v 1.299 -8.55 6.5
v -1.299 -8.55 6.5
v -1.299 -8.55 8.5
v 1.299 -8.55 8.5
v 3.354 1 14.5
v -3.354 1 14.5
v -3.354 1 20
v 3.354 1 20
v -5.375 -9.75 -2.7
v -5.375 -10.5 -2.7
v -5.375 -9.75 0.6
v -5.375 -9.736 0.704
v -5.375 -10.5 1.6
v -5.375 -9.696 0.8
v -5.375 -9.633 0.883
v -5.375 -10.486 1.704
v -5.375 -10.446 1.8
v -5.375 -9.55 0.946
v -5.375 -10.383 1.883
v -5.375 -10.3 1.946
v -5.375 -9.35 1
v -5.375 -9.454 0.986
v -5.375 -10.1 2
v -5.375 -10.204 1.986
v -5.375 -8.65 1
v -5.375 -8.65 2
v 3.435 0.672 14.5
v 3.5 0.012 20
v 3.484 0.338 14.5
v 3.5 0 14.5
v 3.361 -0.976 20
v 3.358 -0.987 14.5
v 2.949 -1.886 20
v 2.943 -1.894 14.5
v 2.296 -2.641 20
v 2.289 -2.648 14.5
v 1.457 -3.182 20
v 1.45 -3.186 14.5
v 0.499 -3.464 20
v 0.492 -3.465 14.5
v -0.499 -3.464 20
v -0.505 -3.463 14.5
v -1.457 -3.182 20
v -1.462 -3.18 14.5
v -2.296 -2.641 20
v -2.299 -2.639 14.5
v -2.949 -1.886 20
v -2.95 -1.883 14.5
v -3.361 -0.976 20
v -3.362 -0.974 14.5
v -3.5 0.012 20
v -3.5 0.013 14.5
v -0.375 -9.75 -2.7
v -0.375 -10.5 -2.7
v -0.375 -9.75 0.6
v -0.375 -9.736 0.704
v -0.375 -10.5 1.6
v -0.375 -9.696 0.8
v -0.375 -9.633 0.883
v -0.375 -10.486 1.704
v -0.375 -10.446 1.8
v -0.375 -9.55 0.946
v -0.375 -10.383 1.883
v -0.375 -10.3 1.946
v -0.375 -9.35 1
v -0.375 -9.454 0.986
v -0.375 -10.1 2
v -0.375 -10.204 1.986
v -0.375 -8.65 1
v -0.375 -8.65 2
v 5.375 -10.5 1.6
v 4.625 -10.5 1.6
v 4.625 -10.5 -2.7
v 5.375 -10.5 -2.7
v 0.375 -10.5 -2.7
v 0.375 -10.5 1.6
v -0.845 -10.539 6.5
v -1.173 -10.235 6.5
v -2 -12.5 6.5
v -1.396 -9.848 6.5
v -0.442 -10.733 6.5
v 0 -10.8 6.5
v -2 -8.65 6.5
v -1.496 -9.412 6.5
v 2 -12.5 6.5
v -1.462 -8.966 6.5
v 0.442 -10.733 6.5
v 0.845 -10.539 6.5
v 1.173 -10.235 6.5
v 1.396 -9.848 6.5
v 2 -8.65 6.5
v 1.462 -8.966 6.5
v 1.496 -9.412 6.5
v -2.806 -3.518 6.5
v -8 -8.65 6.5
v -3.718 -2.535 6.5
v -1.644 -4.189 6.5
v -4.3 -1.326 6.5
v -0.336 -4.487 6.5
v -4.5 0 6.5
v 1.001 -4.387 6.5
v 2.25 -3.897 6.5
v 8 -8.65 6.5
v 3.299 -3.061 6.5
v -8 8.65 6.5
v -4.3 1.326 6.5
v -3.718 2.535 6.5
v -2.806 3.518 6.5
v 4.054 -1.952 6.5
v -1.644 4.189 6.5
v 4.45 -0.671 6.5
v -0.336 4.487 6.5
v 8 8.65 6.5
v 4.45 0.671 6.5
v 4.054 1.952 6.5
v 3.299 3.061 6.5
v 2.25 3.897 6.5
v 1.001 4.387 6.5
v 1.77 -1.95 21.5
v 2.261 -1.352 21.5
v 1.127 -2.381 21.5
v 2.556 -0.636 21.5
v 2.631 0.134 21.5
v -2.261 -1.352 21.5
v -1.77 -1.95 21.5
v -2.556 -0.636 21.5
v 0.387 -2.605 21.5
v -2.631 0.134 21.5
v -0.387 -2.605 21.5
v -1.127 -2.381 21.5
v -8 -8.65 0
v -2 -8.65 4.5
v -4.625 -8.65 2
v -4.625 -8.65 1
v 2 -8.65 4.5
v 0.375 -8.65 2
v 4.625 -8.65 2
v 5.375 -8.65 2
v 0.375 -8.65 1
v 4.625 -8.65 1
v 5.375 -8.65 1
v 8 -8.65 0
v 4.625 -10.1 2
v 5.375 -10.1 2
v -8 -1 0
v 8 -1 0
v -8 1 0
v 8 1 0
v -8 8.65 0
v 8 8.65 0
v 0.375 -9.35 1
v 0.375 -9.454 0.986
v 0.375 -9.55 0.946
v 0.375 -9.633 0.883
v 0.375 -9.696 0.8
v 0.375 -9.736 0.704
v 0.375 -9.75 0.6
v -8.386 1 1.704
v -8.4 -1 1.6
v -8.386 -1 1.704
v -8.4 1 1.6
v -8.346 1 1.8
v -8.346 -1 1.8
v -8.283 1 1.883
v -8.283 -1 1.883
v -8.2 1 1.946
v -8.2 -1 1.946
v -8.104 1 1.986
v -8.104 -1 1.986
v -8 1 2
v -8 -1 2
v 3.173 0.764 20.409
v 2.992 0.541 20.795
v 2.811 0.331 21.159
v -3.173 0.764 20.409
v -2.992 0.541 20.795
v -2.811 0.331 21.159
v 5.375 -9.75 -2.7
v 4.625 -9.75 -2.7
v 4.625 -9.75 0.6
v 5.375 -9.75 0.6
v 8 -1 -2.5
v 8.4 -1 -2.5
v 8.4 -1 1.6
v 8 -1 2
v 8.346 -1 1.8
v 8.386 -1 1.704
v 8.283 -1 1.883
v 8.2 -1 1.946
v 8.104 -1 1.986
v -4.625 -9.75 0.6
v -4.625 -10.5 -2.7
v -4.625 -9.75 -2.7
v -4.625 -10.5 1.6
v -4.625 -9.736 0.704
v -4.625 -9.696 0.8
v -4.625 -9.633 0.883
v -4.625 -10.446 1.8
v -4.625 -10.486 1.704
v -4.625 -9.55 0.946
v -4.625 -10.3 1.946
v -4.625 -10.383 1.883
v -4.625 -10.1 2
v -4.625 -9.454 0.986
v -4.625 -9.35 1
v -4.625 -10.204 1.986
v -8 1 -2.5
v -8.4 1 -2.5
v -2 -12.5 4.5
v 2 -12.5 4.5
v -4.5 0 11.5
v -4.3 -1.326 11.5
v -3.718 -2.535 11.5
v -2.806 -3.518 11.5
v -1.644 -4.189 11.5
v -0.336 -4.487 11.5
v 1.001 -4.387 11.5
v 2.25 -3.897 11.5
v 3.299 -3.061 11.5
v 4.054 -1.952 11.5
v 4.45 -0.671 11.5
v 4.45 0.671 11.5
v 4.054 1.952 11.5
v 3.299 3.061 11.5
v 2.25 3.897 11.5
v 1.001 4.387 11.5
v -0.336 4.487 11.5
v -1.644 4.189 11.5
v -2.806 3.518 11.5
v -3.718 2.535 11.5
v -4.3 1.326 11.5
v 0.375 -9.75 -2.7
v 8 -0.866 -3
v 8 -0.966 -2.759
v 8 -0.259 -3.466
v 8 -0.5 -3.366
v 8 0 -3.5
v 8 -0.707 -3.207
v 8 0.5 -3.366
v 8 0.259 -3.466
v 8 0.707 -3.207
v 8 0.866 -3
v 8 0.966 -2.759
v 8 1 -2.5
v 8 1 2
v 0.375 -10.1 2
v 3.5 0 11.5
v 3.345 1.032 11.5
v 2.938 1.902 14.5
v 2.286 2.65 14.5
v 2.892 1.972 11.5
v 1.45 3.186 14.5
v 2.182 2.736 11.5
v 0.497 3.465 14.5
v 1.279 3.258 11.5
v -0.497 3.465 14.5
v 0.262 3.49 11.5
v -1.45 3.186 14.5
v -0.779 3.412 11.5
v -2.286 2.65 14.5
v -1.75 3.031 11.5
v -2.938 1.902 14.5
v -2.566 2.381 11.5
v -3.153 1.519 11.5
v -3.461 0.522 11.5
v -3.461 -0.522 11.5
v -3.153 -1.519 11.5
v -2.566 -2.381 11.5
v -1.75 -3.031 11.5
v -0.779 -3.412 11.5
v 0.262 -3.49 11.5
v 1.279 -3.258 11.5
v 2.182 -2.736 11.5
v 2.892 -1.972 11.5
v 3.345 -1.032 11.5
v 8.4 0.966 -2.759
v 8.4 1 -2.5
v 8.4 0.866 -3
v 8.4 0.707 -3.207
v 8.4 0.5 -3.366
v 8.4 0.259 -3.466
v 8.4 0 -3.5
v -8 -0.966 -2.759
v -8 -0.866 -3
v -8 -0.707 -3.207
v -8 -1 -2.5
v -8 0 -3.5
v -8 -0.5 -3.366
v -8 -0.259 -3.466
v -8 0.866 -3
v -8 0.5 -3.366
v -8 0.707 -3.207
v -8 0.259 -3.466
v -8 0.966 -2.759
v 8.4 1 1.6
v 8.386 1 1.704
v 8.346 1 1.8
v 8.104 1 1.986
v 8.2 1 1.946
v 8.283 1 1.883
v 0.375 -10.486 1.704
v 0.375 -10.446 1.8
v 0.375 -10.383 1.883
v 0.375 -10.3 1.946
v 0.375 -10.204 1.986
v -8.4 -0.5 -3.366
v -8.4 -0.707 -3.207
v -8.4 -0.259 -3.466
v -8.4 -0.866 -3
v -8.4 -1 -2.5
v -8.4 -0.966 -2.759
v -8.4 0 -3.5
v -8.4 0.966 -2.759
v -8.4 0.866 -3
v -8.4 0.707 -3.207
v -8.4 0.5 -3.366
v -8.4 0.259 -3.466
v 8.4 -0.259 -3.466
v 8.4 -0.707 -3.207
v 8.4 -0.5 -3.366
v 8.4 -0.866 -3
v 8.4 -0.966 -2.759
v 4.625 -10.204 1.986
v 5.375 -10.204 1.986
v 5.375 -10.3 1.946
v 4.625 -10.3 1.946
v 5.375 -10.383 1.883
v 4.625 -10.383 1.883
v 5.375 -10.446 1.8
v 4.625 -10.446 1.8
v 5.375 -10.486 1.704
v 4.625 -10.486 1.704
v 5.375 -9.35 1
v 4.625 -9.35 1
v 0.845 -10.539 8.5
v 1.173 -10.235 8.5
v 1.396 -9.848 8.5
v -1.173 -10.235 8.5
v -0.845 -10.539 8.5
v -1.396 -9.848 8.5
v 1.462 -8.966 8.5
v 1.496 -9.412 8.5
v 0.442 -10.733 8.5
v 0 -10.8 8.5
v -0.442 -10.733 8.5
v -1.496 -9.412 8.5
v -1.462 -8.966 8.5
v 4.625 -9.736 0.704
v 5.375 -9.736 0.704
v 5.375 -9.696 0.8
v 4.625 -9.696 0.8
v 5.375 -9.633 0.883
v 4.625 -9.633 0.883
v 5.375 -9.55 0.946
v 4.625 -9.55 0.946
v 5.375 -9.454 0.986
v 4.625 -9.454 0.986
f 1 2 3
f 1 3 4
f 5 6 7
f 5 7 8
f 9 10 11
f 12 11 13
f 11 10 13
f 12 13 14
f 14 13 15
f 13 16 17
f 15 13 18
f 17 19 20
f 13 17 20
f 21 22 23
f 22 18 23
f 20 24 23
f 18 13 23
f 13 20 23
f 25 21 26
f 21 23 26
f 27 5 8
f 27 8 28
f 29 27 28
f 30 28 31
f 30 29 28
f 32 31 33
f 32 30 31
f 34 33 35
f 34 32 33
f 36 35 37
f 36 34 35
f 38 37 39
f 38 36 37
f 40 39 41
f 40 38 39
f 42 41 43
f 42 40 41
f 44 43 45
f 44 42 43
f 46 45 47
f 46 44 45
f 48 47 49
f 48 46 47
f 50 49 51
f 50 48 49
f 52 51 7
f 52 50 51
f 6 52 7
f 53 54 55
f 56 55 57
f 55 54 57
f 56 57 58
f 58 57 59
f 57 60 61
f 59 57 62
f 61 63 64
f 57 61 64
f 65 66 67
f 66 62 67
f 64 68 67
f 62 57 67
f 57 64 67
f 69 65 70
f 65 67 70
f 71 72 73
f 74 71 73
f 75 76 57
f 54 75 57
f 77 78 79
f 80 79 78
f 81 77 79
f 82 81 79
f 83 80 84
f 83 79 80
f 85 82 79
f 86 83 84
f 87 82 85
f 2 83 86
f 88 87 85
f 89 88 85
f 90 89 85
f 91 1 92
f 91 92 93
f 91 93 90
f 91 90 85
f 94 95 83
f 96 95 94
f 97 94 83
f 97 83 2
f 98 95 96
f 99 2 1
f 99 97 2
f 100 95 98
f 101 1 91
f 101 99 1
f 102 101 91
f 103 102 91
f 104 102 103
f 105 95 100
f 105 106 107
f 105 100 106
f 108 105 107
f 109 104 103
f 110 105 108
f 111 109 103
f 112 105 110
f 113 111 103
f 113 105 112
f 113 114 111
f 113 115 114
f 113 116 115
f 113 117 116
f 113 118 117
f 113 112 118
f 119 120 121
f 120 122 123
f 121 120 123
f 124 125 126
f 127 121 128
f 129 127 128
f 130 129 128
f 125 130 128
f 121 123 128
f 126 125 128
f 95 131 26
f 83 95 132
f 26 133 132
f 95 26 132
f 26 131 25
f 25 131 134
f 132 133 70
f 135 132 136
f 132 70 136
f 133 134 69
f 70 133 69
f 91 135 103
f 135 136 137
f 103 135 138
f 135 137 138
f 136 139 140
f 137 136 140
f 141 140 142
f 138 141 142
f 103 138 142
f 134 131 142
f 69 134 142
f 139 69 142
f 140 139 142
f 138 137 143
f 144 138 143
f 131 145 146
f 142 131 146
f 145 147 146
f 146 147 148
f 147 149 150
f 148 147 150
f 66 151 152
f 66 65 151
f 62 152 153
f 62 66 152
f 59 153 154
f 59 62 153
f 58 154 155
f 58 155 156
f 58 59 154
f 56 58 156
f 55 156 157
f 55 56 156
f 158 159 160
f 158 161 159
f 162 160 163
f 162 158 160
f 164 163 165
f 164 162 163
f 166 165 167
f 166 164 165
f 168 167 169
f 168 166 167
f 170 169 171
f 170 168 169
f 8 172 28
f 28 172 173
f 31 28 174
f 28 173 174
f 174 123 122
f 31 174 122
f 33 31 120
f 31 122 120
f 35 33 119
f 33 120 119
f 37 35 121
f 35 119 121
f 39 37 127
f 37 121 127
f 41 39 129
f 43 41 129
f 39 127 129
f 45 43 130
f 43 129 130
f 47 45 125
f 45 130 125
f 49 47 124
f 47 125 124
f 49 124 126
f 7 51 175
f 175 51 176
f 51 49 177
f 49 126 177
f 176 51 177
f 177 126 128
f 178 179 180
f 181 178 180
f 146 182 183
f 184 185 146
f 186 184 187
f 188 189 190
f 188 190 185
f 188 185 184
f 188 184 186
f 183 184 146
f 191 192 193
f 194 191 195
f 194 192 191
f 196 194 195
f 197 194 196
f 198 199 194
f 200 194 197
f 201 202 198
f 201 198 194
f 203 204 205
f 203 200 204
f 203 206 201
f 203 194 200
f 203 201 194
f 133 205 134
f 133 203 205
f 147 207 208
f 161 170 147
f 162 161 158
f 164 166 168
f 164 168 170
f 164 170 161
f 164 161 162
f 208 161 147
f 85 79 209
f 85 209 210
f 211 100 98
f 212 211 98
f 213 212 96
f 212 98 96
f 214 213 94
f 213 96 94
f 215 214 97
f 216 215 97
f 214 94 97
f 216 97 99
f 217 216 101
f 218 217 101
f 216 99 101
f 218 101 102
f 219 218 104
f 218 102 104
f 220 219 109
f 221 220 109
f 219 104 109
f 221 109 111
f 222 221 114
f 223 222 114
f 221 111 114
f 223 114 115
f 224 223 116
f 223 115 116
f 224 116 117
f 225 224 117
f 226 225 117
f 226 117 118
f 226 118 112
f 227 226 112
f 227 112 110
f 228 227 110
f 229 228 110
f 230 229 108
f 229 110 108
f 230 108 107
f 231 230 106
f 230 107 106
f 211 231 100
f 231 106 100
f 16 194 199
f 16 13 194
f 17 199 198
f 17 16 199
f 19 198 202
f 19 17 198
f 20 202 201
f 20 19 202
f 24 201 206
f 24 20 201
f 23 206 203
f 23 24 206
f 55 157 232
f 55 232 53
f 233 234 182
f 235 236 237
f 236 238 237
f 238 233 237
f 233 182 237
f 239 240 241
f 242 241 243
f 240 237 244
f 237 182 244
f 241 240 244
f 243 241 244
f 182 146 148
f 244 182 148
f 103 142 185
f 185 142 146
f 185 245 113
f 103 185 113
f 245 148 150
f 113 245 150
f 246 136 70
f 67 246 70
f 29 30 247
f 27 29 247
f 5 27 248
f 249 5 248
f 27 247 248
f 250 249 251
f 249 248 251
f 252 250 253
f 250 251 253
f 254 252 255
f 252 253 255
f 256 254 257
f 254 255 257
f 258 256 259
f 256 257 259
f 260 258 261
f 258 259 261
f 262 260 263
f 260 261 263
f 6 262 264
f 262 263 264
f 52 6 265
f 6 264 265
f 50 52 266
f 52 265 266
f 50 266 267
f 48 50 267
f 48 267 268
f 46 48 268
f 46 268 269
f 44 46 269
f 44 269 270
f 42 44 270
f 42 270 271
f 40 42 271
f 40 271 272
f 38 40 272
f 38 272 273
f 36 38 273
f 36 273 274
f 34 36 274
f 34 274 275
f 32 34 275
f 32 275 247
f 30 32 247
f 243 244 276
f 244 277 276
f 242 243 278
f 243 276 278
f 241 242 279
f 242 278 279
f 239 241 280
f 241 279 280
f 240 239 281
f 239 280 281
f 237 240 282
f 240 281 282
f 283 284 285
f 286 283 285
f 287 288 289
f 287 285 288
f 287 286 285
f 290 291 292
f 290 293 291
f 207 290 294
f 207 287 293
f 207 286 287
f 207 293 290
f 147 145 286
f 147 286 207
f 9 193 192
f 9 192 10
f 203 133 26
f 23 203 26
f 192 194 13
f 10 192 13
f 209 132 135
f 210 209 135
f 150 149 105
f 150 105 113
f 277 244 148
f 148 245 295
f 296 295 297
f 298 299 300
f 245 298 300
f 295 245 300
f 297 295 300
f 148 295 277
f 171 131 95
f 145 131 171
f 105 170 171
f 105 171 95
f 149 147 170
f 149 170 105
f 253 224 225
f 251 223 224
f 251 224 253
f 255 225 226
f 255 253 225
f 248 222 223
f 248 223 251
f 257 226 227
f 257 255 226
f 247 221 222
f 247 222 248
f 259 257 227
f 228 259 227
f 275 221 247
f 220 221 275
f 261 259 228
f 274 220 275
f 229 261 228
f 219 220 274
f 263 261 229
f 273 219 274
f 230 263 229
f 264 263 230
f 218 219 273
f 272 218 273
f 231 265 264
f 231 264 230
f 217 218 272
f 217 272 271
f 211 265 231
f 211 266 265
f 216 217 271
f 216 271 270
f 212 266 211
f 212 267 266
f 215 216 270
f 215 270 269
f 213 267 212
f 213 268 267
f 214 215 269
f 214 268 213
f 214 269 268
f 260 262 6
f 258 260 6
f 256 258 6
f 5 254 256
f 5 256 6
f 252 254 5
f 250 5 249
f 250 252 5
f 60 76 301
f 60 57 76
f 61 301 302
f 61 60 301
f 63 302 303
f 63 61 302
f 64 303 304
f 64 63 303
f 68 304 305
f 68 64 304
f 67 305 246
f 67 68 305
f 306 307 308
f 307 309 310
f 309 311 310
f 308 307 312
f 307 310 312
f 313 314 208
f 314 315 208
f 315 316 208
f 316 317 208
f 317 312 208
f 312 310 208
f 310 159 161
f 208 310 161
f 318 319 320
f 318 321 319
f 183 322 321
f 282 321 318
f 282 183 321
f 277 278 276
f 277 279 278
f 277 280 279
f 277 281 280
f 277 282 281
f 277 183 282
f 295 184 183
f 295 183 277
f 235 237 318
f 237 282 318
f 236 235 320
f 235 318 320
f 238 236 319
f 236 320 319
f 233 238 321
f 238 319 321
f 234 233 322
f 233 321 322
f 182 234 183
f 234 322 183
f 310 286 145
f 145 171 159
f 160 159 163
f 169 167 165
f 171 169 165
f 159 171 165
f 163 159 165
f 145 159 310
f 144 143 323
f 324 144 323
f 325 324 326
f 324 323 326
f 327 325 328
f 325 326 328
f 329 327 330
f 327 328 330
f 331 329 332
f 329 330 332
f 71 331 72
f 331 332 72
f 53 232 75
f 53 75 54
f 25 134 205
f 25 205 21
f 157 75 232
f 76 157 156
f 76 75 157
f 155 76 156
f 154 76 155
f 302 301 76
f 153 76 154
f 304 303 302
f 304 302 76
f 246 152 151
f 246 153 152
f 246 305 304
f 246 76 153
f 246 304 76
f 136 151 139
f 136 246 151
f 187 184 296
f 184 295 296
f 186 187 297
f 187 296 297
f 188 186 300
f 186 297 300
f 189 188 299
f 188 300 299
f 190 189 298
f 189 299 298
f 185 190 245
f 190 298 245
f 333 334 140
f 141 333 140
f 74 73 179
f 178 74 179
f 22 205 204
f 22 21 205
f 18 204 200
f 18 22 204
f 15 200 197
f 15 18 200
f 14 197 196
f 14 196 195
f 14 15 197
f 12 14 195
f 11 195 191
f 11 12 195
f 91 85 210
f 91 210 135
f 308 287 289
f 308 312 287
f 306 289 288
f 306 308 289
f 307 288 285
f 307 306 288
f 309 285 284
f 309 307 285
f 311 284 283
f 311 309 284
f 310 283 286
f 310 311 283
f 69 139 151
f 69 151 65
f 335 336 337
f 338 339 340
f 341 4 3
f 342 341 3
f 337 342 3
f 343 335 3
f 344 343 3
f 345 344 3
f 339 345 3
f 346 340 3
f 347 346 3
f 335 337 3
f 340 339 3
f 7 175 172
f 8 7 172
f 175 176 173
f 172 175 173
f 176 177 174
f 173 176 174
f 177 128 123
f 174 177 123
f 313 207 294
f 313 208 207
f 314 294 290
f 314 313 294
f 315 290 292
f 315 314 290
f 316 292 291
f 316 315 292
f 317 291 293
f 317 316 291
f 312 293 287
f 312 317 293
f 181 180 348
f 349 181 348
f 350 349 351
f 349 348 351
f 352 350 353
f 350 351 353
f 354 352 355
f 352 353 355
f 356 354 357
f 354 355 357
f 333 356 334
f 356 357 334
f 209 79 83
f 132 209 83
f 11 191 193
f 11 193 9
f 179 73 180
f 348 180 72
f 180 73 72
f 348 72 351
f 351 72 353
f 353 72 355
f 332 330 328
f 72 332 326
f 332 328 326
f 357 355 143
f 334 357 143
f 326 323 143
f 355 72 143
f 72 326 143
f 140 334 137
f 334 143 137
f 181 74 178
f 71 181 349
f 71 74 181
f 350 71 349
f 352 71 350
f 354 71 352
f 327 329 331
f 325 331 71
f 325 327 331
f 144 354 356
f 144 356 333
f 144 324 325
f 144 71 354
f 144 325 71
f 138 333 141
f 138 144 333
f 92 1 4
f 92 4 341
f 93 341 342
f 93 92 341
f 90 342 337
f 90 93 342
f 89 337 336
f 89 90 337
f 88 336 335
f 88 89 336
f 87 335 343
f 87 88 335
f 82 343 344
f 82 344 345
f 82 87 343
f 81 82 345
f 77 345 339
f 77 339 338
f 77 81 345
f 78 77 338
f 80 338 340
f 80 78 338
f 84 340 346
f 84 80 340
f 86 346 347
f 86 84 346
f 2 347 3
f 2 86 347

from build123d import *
from OCP.BRepFilletAPI import BRepFilletAPI_MakeChamfer

# Parameters (mm, degrees)
SKETCH1_W              = 16
SKETCH1_H              = 17.3
BOSS_EXTRUDE1_DEPTH    = 6.5
SKETCH2_W              = 4
SKETCH2_H              = 3.85
BOSS_EXTRUDE2_DEPTH    = 2
BOSS_EXTRUDE3_DEPTH    = 2
SKETCH4_R              = 4.5
BOSS_EXTRUDE4_DEPTH    = 5
SKETCH5_R              = 3.5
BOSS_EXTRUDE5_DEPTH    = 3
BOSS_EXTRUDE6_DEPTH    = 7
CHAMFER1_SIZE          = 1.5
CHAMFER1_SIZE2         = 0.866025404
SKETCH7_W              = 0.75
SKETCH7_H              = 1.85
BOSS_EXTRUDE7_DEPTH    = 1
SKETCH8_W              = 0.75
SKETCH8_H              = 0.75
BOSS_EXTRUDE8_DEPTH    = 3.7
FILLET1_R              = 0.4
LPATTERN1_COUNT        = 2
LPATTERN1_PITCH        = 5
FILLET1_OF_LPATTERN1_R = 0.4
MIRROR1_START          = 4.625
MIRROR1_DEPTH          = 0.75
SKETCH10_W             = 0.4
SKETCH10_H             = 2
BOSS_EXTRUDE9_DEPTH    = 5.5
FILLET2_R              = 0.4
FILLET3_R              = 1
FILLET2_OF_MIRROR2_R   = 0.4
FILLET3_OF_MIRROR2_R   = 1


# Read off the part's stored shape, not the designer's step: Mirror1
with BuildPart() as part:
    # Sketch1 → Boss-Extrude1 (new body)
    with BuildSketch(Plane.XY):
        Rectangle(SKETCH1_W, SKETCH1_H)
    extrude(amount=BOSS_EXTRUDE1_DEPTH)

    # Sketch2 → Boss-Extrude2 (add)
    with BuildSketch(Plane.XY.offset(6.5)):
        with Locations((0, -10.575)):
            Rectangle(SKETCH2_W, SKETCH2_H)
    extrude(amount=-BOSS_EXTRUDE2_DEPTH)

    # Sketch3 → Boss-Extrude3 (add)
    with BuildSketch(Plane.XY.offset(6.5)):
        with BuildLine():
            Line((-1.299038106, -8.55), (1.299038106, -8.55))
            ThreePointArc((1.299038106, -8.55), (0, -10.8), (-1.299038106, -8.55))
        make_face()
    extrude(amount=BOSS_EXTRUDE3_DEPTH)

    # Sketch4 → Boss-Extrude4 (add)
    with BuildSketch(Plane.XY.offset(6.5)):
        with Locations(Location((0, 0, 0), (0, 0, 180))):
            Circle(SKETCH4_R)
    extrude(amount=BOSS_EXTRUDE4_DEPTH)

    # Sketch5 → Boss-Extrude5 (add)
    with BuildSketch(Plane.XY.offset(11.5)):
        Circle(SKETCH5_R)
    extrude(amount=BOSS_EXTRUDE5_DEPTH)

    # Sketch6 → Boss-Extrude6 (add)
    with BuildSketch(Plane.XY.offset(14.5)):
        with BuildLine():
            Line((-3.354101966, 1), (3.354101966, 1))
            ThreePointArc((3.354101966, 1), (0, -3.5), (-3.354101966, 1))
        make_face()
    extrude(amount=BOSS_EXTRUDE6_DEPTH)

    # Chamfer1: one chamfer whose edges measure the first distance from different faces: ONE call of the kernel's chamfer builder (chamfer() names one face for all edges)
    chamfer1_edges_1 = [part.edges().sort_by_distance(p)[0] for p in [
        (0, -3.5, 21.5),
    ]]
    chamfer1_side_1 = [part.faces().sort_by_distance(p)[0] for p in [
        (0, -3.5, 18),
    ]]
    chamfer1_edges_2 = [part.edges().sort_by_distance(p)[0] for p in [
        (0, 1, 21.5),
    ]]
    chamfer1_side_2 = [part.faces().sort_by_distance(p)[0] for p in [
        (0, 1, 18),
    ]]
    chamfer1 = BRepFilletAPI_MakeChamfer(part.part.solid().wrapped)
    for e in chamfer1_edges_1:
        chamfer1.Add(CHAMFER1_SIZE, CHAMFER1_SIZE2, e.wrapped, chamfer1_side_1[0].wrapped)  # the first distance lies on this face
    for e in chamfer1_edges_2:
        chamfer1.Add(CHAMFER1_SIZE, CHAMFER1_SIZE2, e.wrapped, chamfer1_side_2[0].wrapped)  # the first distance lies on this face
    add(Compound.cast(chamfer1.Shape()), mode=Mode.REPLACE)

    # Sketch7 → Boss-Extrude7 (add)
    with BuildSketch(Plane(origin=(0, 0, 2), x_dir=(-1, 0, 0), z_dir=(0, 0, -1))):
        with Locations((0, -9.575)):
            Rectangle(SKETCH7_W, SKETCH7_H)
    boss_extrude7 = extrude(amount=BOSS_EXTRUDE7_DEPTH)

    # Sketch8 → Boss-Extrude8 (add)
    with BuildSketch(Plane(origin=(0, 0, 1), x_dir=(-1, 0, 0), z_dir=(0, 0, -1))):
        with Locations((0, -10.125)):
            Rectangle(SKETCH8_W, SKETCH8_H)
    boss_extrude8 = extrude(amount=BOSS_EXTRUDE8_DEPTH)

    # Fillet1
    fillet1_edges = [part.edges().sort_by_distance(p)[0] for p in [
        (0, -10.5, 2),
        (0, -9.75, 1),
    ]]
    fillet(fillet1_edges, radius=FILLET1_R)

    # LPattern1: Boss-Extrude7, Boss-Extrude8 ×2
    with Locations(*[(-i * LPATTERN1_PITCH, 0, 0) for i in range(1, LPATTERN1_COUNT)]):
        add(boss_extrude7)
        add(boss_extrude8)

    # Fillet1 of LPattern1
    fillet1_of_lpattern1_edges = [part.edges().sort_by_distance(p)[0] for p in [
        (-5, -10.5, 2),
        (-5, -9.75, 1),
    ]]
    fillet(fillet1_of_lpattern1_edges, radius=FILLET1_OF_LPATTERN1_R)

    # Mirror1 outline → Mirror1 (add)
    with BuildSketch(Plane.YZ.offset(MIRROR1_START)):
        with BuildLine():
            ThreePointArc((-9.75, 0.6), (-9.632842712, 0.882842712), (-9.35, 1))
            Line((-9.35, 1), (-8.65, 1))
            Line((-8.65, 1), (-8.65, 2))
            Line((-8.65, 2), (-10.1, 2))
            ThreePointArc((-10.1, 2), (-10.382842712, 1.882842712), (-10.5, 1.6))
            Line((-10.5, 1.6), (-10.5, -2.7))
            Line((-10.5, -2.7), (-9.75, -2.7))
            Line((-9.75, -2.7), (-9.75, 0.6))
        make_face()
    extrude(amount=MIRROR1_DEPTH)

    # Sketch10 → Boss-Extrude9 (add)
    with BuildSketch(Plane(origin=(0, 0, 2), x_dir=(-1, 0, 0), z_dir=(0, 0, -1))):
        with Locations((8.2, 0)):
            Rectangle(SKETCH10_W, SKETCH10_H)
    boss_extrude9 = extrude(amount=BOSS_EXTRUDE9_DEPTH)

    # Fillet2
    fillet2_edges = [part.edges().sort_by_distance(p)[0] for p in [
        (-8.4, 0, 2),
    ]]
    fillet(fillet2_edges, radius=FILLET2_R - 0.0001)  # a hair under: the kernel refuses the full size

    # Fillet3
    fillet3_edges = [part.edges().sort_by_distance(p)[0] for p in [
        (-8.2, 1, -3.5),
        (-8.2, -1, -3.5),
    ]]
    fillet(fillet3_edges, radius=FILLET3_R - 0.0001)  # a hair under: the kernel refuses the full size

    # Mirror2: Boss-Extrude9 across plane
    add(boss_extrude9.mirror(Plane.ZY))

    # Fillet2 of Mirror2
    fillet2_of_mirror2_edges = [part.edges().sort_by_distance(p)[0] for p in [
        (8.4, 0, 2),
    ]]
    fillet(fillet2_of_mirror2_edges, radius=FILLET2_OF_MIRROR2_R - 0.0001)  # a hair under: the kernel refuses the full size

    # Fillet3 of Mirror2
    fillet3_of_mirror2_edges = [part.edges().sort_by_distance(p)[0] for p in [
        (8.2, 1, -3.5),
        (8.2, -1, -3.5),
    ]]
    fillet(fillet3_of_mirror2_edges, radius=FILLET3_OF_MIRROR2_R - 0.0001)  # a hair under: the kernel refuses the full size


solid = part.part
